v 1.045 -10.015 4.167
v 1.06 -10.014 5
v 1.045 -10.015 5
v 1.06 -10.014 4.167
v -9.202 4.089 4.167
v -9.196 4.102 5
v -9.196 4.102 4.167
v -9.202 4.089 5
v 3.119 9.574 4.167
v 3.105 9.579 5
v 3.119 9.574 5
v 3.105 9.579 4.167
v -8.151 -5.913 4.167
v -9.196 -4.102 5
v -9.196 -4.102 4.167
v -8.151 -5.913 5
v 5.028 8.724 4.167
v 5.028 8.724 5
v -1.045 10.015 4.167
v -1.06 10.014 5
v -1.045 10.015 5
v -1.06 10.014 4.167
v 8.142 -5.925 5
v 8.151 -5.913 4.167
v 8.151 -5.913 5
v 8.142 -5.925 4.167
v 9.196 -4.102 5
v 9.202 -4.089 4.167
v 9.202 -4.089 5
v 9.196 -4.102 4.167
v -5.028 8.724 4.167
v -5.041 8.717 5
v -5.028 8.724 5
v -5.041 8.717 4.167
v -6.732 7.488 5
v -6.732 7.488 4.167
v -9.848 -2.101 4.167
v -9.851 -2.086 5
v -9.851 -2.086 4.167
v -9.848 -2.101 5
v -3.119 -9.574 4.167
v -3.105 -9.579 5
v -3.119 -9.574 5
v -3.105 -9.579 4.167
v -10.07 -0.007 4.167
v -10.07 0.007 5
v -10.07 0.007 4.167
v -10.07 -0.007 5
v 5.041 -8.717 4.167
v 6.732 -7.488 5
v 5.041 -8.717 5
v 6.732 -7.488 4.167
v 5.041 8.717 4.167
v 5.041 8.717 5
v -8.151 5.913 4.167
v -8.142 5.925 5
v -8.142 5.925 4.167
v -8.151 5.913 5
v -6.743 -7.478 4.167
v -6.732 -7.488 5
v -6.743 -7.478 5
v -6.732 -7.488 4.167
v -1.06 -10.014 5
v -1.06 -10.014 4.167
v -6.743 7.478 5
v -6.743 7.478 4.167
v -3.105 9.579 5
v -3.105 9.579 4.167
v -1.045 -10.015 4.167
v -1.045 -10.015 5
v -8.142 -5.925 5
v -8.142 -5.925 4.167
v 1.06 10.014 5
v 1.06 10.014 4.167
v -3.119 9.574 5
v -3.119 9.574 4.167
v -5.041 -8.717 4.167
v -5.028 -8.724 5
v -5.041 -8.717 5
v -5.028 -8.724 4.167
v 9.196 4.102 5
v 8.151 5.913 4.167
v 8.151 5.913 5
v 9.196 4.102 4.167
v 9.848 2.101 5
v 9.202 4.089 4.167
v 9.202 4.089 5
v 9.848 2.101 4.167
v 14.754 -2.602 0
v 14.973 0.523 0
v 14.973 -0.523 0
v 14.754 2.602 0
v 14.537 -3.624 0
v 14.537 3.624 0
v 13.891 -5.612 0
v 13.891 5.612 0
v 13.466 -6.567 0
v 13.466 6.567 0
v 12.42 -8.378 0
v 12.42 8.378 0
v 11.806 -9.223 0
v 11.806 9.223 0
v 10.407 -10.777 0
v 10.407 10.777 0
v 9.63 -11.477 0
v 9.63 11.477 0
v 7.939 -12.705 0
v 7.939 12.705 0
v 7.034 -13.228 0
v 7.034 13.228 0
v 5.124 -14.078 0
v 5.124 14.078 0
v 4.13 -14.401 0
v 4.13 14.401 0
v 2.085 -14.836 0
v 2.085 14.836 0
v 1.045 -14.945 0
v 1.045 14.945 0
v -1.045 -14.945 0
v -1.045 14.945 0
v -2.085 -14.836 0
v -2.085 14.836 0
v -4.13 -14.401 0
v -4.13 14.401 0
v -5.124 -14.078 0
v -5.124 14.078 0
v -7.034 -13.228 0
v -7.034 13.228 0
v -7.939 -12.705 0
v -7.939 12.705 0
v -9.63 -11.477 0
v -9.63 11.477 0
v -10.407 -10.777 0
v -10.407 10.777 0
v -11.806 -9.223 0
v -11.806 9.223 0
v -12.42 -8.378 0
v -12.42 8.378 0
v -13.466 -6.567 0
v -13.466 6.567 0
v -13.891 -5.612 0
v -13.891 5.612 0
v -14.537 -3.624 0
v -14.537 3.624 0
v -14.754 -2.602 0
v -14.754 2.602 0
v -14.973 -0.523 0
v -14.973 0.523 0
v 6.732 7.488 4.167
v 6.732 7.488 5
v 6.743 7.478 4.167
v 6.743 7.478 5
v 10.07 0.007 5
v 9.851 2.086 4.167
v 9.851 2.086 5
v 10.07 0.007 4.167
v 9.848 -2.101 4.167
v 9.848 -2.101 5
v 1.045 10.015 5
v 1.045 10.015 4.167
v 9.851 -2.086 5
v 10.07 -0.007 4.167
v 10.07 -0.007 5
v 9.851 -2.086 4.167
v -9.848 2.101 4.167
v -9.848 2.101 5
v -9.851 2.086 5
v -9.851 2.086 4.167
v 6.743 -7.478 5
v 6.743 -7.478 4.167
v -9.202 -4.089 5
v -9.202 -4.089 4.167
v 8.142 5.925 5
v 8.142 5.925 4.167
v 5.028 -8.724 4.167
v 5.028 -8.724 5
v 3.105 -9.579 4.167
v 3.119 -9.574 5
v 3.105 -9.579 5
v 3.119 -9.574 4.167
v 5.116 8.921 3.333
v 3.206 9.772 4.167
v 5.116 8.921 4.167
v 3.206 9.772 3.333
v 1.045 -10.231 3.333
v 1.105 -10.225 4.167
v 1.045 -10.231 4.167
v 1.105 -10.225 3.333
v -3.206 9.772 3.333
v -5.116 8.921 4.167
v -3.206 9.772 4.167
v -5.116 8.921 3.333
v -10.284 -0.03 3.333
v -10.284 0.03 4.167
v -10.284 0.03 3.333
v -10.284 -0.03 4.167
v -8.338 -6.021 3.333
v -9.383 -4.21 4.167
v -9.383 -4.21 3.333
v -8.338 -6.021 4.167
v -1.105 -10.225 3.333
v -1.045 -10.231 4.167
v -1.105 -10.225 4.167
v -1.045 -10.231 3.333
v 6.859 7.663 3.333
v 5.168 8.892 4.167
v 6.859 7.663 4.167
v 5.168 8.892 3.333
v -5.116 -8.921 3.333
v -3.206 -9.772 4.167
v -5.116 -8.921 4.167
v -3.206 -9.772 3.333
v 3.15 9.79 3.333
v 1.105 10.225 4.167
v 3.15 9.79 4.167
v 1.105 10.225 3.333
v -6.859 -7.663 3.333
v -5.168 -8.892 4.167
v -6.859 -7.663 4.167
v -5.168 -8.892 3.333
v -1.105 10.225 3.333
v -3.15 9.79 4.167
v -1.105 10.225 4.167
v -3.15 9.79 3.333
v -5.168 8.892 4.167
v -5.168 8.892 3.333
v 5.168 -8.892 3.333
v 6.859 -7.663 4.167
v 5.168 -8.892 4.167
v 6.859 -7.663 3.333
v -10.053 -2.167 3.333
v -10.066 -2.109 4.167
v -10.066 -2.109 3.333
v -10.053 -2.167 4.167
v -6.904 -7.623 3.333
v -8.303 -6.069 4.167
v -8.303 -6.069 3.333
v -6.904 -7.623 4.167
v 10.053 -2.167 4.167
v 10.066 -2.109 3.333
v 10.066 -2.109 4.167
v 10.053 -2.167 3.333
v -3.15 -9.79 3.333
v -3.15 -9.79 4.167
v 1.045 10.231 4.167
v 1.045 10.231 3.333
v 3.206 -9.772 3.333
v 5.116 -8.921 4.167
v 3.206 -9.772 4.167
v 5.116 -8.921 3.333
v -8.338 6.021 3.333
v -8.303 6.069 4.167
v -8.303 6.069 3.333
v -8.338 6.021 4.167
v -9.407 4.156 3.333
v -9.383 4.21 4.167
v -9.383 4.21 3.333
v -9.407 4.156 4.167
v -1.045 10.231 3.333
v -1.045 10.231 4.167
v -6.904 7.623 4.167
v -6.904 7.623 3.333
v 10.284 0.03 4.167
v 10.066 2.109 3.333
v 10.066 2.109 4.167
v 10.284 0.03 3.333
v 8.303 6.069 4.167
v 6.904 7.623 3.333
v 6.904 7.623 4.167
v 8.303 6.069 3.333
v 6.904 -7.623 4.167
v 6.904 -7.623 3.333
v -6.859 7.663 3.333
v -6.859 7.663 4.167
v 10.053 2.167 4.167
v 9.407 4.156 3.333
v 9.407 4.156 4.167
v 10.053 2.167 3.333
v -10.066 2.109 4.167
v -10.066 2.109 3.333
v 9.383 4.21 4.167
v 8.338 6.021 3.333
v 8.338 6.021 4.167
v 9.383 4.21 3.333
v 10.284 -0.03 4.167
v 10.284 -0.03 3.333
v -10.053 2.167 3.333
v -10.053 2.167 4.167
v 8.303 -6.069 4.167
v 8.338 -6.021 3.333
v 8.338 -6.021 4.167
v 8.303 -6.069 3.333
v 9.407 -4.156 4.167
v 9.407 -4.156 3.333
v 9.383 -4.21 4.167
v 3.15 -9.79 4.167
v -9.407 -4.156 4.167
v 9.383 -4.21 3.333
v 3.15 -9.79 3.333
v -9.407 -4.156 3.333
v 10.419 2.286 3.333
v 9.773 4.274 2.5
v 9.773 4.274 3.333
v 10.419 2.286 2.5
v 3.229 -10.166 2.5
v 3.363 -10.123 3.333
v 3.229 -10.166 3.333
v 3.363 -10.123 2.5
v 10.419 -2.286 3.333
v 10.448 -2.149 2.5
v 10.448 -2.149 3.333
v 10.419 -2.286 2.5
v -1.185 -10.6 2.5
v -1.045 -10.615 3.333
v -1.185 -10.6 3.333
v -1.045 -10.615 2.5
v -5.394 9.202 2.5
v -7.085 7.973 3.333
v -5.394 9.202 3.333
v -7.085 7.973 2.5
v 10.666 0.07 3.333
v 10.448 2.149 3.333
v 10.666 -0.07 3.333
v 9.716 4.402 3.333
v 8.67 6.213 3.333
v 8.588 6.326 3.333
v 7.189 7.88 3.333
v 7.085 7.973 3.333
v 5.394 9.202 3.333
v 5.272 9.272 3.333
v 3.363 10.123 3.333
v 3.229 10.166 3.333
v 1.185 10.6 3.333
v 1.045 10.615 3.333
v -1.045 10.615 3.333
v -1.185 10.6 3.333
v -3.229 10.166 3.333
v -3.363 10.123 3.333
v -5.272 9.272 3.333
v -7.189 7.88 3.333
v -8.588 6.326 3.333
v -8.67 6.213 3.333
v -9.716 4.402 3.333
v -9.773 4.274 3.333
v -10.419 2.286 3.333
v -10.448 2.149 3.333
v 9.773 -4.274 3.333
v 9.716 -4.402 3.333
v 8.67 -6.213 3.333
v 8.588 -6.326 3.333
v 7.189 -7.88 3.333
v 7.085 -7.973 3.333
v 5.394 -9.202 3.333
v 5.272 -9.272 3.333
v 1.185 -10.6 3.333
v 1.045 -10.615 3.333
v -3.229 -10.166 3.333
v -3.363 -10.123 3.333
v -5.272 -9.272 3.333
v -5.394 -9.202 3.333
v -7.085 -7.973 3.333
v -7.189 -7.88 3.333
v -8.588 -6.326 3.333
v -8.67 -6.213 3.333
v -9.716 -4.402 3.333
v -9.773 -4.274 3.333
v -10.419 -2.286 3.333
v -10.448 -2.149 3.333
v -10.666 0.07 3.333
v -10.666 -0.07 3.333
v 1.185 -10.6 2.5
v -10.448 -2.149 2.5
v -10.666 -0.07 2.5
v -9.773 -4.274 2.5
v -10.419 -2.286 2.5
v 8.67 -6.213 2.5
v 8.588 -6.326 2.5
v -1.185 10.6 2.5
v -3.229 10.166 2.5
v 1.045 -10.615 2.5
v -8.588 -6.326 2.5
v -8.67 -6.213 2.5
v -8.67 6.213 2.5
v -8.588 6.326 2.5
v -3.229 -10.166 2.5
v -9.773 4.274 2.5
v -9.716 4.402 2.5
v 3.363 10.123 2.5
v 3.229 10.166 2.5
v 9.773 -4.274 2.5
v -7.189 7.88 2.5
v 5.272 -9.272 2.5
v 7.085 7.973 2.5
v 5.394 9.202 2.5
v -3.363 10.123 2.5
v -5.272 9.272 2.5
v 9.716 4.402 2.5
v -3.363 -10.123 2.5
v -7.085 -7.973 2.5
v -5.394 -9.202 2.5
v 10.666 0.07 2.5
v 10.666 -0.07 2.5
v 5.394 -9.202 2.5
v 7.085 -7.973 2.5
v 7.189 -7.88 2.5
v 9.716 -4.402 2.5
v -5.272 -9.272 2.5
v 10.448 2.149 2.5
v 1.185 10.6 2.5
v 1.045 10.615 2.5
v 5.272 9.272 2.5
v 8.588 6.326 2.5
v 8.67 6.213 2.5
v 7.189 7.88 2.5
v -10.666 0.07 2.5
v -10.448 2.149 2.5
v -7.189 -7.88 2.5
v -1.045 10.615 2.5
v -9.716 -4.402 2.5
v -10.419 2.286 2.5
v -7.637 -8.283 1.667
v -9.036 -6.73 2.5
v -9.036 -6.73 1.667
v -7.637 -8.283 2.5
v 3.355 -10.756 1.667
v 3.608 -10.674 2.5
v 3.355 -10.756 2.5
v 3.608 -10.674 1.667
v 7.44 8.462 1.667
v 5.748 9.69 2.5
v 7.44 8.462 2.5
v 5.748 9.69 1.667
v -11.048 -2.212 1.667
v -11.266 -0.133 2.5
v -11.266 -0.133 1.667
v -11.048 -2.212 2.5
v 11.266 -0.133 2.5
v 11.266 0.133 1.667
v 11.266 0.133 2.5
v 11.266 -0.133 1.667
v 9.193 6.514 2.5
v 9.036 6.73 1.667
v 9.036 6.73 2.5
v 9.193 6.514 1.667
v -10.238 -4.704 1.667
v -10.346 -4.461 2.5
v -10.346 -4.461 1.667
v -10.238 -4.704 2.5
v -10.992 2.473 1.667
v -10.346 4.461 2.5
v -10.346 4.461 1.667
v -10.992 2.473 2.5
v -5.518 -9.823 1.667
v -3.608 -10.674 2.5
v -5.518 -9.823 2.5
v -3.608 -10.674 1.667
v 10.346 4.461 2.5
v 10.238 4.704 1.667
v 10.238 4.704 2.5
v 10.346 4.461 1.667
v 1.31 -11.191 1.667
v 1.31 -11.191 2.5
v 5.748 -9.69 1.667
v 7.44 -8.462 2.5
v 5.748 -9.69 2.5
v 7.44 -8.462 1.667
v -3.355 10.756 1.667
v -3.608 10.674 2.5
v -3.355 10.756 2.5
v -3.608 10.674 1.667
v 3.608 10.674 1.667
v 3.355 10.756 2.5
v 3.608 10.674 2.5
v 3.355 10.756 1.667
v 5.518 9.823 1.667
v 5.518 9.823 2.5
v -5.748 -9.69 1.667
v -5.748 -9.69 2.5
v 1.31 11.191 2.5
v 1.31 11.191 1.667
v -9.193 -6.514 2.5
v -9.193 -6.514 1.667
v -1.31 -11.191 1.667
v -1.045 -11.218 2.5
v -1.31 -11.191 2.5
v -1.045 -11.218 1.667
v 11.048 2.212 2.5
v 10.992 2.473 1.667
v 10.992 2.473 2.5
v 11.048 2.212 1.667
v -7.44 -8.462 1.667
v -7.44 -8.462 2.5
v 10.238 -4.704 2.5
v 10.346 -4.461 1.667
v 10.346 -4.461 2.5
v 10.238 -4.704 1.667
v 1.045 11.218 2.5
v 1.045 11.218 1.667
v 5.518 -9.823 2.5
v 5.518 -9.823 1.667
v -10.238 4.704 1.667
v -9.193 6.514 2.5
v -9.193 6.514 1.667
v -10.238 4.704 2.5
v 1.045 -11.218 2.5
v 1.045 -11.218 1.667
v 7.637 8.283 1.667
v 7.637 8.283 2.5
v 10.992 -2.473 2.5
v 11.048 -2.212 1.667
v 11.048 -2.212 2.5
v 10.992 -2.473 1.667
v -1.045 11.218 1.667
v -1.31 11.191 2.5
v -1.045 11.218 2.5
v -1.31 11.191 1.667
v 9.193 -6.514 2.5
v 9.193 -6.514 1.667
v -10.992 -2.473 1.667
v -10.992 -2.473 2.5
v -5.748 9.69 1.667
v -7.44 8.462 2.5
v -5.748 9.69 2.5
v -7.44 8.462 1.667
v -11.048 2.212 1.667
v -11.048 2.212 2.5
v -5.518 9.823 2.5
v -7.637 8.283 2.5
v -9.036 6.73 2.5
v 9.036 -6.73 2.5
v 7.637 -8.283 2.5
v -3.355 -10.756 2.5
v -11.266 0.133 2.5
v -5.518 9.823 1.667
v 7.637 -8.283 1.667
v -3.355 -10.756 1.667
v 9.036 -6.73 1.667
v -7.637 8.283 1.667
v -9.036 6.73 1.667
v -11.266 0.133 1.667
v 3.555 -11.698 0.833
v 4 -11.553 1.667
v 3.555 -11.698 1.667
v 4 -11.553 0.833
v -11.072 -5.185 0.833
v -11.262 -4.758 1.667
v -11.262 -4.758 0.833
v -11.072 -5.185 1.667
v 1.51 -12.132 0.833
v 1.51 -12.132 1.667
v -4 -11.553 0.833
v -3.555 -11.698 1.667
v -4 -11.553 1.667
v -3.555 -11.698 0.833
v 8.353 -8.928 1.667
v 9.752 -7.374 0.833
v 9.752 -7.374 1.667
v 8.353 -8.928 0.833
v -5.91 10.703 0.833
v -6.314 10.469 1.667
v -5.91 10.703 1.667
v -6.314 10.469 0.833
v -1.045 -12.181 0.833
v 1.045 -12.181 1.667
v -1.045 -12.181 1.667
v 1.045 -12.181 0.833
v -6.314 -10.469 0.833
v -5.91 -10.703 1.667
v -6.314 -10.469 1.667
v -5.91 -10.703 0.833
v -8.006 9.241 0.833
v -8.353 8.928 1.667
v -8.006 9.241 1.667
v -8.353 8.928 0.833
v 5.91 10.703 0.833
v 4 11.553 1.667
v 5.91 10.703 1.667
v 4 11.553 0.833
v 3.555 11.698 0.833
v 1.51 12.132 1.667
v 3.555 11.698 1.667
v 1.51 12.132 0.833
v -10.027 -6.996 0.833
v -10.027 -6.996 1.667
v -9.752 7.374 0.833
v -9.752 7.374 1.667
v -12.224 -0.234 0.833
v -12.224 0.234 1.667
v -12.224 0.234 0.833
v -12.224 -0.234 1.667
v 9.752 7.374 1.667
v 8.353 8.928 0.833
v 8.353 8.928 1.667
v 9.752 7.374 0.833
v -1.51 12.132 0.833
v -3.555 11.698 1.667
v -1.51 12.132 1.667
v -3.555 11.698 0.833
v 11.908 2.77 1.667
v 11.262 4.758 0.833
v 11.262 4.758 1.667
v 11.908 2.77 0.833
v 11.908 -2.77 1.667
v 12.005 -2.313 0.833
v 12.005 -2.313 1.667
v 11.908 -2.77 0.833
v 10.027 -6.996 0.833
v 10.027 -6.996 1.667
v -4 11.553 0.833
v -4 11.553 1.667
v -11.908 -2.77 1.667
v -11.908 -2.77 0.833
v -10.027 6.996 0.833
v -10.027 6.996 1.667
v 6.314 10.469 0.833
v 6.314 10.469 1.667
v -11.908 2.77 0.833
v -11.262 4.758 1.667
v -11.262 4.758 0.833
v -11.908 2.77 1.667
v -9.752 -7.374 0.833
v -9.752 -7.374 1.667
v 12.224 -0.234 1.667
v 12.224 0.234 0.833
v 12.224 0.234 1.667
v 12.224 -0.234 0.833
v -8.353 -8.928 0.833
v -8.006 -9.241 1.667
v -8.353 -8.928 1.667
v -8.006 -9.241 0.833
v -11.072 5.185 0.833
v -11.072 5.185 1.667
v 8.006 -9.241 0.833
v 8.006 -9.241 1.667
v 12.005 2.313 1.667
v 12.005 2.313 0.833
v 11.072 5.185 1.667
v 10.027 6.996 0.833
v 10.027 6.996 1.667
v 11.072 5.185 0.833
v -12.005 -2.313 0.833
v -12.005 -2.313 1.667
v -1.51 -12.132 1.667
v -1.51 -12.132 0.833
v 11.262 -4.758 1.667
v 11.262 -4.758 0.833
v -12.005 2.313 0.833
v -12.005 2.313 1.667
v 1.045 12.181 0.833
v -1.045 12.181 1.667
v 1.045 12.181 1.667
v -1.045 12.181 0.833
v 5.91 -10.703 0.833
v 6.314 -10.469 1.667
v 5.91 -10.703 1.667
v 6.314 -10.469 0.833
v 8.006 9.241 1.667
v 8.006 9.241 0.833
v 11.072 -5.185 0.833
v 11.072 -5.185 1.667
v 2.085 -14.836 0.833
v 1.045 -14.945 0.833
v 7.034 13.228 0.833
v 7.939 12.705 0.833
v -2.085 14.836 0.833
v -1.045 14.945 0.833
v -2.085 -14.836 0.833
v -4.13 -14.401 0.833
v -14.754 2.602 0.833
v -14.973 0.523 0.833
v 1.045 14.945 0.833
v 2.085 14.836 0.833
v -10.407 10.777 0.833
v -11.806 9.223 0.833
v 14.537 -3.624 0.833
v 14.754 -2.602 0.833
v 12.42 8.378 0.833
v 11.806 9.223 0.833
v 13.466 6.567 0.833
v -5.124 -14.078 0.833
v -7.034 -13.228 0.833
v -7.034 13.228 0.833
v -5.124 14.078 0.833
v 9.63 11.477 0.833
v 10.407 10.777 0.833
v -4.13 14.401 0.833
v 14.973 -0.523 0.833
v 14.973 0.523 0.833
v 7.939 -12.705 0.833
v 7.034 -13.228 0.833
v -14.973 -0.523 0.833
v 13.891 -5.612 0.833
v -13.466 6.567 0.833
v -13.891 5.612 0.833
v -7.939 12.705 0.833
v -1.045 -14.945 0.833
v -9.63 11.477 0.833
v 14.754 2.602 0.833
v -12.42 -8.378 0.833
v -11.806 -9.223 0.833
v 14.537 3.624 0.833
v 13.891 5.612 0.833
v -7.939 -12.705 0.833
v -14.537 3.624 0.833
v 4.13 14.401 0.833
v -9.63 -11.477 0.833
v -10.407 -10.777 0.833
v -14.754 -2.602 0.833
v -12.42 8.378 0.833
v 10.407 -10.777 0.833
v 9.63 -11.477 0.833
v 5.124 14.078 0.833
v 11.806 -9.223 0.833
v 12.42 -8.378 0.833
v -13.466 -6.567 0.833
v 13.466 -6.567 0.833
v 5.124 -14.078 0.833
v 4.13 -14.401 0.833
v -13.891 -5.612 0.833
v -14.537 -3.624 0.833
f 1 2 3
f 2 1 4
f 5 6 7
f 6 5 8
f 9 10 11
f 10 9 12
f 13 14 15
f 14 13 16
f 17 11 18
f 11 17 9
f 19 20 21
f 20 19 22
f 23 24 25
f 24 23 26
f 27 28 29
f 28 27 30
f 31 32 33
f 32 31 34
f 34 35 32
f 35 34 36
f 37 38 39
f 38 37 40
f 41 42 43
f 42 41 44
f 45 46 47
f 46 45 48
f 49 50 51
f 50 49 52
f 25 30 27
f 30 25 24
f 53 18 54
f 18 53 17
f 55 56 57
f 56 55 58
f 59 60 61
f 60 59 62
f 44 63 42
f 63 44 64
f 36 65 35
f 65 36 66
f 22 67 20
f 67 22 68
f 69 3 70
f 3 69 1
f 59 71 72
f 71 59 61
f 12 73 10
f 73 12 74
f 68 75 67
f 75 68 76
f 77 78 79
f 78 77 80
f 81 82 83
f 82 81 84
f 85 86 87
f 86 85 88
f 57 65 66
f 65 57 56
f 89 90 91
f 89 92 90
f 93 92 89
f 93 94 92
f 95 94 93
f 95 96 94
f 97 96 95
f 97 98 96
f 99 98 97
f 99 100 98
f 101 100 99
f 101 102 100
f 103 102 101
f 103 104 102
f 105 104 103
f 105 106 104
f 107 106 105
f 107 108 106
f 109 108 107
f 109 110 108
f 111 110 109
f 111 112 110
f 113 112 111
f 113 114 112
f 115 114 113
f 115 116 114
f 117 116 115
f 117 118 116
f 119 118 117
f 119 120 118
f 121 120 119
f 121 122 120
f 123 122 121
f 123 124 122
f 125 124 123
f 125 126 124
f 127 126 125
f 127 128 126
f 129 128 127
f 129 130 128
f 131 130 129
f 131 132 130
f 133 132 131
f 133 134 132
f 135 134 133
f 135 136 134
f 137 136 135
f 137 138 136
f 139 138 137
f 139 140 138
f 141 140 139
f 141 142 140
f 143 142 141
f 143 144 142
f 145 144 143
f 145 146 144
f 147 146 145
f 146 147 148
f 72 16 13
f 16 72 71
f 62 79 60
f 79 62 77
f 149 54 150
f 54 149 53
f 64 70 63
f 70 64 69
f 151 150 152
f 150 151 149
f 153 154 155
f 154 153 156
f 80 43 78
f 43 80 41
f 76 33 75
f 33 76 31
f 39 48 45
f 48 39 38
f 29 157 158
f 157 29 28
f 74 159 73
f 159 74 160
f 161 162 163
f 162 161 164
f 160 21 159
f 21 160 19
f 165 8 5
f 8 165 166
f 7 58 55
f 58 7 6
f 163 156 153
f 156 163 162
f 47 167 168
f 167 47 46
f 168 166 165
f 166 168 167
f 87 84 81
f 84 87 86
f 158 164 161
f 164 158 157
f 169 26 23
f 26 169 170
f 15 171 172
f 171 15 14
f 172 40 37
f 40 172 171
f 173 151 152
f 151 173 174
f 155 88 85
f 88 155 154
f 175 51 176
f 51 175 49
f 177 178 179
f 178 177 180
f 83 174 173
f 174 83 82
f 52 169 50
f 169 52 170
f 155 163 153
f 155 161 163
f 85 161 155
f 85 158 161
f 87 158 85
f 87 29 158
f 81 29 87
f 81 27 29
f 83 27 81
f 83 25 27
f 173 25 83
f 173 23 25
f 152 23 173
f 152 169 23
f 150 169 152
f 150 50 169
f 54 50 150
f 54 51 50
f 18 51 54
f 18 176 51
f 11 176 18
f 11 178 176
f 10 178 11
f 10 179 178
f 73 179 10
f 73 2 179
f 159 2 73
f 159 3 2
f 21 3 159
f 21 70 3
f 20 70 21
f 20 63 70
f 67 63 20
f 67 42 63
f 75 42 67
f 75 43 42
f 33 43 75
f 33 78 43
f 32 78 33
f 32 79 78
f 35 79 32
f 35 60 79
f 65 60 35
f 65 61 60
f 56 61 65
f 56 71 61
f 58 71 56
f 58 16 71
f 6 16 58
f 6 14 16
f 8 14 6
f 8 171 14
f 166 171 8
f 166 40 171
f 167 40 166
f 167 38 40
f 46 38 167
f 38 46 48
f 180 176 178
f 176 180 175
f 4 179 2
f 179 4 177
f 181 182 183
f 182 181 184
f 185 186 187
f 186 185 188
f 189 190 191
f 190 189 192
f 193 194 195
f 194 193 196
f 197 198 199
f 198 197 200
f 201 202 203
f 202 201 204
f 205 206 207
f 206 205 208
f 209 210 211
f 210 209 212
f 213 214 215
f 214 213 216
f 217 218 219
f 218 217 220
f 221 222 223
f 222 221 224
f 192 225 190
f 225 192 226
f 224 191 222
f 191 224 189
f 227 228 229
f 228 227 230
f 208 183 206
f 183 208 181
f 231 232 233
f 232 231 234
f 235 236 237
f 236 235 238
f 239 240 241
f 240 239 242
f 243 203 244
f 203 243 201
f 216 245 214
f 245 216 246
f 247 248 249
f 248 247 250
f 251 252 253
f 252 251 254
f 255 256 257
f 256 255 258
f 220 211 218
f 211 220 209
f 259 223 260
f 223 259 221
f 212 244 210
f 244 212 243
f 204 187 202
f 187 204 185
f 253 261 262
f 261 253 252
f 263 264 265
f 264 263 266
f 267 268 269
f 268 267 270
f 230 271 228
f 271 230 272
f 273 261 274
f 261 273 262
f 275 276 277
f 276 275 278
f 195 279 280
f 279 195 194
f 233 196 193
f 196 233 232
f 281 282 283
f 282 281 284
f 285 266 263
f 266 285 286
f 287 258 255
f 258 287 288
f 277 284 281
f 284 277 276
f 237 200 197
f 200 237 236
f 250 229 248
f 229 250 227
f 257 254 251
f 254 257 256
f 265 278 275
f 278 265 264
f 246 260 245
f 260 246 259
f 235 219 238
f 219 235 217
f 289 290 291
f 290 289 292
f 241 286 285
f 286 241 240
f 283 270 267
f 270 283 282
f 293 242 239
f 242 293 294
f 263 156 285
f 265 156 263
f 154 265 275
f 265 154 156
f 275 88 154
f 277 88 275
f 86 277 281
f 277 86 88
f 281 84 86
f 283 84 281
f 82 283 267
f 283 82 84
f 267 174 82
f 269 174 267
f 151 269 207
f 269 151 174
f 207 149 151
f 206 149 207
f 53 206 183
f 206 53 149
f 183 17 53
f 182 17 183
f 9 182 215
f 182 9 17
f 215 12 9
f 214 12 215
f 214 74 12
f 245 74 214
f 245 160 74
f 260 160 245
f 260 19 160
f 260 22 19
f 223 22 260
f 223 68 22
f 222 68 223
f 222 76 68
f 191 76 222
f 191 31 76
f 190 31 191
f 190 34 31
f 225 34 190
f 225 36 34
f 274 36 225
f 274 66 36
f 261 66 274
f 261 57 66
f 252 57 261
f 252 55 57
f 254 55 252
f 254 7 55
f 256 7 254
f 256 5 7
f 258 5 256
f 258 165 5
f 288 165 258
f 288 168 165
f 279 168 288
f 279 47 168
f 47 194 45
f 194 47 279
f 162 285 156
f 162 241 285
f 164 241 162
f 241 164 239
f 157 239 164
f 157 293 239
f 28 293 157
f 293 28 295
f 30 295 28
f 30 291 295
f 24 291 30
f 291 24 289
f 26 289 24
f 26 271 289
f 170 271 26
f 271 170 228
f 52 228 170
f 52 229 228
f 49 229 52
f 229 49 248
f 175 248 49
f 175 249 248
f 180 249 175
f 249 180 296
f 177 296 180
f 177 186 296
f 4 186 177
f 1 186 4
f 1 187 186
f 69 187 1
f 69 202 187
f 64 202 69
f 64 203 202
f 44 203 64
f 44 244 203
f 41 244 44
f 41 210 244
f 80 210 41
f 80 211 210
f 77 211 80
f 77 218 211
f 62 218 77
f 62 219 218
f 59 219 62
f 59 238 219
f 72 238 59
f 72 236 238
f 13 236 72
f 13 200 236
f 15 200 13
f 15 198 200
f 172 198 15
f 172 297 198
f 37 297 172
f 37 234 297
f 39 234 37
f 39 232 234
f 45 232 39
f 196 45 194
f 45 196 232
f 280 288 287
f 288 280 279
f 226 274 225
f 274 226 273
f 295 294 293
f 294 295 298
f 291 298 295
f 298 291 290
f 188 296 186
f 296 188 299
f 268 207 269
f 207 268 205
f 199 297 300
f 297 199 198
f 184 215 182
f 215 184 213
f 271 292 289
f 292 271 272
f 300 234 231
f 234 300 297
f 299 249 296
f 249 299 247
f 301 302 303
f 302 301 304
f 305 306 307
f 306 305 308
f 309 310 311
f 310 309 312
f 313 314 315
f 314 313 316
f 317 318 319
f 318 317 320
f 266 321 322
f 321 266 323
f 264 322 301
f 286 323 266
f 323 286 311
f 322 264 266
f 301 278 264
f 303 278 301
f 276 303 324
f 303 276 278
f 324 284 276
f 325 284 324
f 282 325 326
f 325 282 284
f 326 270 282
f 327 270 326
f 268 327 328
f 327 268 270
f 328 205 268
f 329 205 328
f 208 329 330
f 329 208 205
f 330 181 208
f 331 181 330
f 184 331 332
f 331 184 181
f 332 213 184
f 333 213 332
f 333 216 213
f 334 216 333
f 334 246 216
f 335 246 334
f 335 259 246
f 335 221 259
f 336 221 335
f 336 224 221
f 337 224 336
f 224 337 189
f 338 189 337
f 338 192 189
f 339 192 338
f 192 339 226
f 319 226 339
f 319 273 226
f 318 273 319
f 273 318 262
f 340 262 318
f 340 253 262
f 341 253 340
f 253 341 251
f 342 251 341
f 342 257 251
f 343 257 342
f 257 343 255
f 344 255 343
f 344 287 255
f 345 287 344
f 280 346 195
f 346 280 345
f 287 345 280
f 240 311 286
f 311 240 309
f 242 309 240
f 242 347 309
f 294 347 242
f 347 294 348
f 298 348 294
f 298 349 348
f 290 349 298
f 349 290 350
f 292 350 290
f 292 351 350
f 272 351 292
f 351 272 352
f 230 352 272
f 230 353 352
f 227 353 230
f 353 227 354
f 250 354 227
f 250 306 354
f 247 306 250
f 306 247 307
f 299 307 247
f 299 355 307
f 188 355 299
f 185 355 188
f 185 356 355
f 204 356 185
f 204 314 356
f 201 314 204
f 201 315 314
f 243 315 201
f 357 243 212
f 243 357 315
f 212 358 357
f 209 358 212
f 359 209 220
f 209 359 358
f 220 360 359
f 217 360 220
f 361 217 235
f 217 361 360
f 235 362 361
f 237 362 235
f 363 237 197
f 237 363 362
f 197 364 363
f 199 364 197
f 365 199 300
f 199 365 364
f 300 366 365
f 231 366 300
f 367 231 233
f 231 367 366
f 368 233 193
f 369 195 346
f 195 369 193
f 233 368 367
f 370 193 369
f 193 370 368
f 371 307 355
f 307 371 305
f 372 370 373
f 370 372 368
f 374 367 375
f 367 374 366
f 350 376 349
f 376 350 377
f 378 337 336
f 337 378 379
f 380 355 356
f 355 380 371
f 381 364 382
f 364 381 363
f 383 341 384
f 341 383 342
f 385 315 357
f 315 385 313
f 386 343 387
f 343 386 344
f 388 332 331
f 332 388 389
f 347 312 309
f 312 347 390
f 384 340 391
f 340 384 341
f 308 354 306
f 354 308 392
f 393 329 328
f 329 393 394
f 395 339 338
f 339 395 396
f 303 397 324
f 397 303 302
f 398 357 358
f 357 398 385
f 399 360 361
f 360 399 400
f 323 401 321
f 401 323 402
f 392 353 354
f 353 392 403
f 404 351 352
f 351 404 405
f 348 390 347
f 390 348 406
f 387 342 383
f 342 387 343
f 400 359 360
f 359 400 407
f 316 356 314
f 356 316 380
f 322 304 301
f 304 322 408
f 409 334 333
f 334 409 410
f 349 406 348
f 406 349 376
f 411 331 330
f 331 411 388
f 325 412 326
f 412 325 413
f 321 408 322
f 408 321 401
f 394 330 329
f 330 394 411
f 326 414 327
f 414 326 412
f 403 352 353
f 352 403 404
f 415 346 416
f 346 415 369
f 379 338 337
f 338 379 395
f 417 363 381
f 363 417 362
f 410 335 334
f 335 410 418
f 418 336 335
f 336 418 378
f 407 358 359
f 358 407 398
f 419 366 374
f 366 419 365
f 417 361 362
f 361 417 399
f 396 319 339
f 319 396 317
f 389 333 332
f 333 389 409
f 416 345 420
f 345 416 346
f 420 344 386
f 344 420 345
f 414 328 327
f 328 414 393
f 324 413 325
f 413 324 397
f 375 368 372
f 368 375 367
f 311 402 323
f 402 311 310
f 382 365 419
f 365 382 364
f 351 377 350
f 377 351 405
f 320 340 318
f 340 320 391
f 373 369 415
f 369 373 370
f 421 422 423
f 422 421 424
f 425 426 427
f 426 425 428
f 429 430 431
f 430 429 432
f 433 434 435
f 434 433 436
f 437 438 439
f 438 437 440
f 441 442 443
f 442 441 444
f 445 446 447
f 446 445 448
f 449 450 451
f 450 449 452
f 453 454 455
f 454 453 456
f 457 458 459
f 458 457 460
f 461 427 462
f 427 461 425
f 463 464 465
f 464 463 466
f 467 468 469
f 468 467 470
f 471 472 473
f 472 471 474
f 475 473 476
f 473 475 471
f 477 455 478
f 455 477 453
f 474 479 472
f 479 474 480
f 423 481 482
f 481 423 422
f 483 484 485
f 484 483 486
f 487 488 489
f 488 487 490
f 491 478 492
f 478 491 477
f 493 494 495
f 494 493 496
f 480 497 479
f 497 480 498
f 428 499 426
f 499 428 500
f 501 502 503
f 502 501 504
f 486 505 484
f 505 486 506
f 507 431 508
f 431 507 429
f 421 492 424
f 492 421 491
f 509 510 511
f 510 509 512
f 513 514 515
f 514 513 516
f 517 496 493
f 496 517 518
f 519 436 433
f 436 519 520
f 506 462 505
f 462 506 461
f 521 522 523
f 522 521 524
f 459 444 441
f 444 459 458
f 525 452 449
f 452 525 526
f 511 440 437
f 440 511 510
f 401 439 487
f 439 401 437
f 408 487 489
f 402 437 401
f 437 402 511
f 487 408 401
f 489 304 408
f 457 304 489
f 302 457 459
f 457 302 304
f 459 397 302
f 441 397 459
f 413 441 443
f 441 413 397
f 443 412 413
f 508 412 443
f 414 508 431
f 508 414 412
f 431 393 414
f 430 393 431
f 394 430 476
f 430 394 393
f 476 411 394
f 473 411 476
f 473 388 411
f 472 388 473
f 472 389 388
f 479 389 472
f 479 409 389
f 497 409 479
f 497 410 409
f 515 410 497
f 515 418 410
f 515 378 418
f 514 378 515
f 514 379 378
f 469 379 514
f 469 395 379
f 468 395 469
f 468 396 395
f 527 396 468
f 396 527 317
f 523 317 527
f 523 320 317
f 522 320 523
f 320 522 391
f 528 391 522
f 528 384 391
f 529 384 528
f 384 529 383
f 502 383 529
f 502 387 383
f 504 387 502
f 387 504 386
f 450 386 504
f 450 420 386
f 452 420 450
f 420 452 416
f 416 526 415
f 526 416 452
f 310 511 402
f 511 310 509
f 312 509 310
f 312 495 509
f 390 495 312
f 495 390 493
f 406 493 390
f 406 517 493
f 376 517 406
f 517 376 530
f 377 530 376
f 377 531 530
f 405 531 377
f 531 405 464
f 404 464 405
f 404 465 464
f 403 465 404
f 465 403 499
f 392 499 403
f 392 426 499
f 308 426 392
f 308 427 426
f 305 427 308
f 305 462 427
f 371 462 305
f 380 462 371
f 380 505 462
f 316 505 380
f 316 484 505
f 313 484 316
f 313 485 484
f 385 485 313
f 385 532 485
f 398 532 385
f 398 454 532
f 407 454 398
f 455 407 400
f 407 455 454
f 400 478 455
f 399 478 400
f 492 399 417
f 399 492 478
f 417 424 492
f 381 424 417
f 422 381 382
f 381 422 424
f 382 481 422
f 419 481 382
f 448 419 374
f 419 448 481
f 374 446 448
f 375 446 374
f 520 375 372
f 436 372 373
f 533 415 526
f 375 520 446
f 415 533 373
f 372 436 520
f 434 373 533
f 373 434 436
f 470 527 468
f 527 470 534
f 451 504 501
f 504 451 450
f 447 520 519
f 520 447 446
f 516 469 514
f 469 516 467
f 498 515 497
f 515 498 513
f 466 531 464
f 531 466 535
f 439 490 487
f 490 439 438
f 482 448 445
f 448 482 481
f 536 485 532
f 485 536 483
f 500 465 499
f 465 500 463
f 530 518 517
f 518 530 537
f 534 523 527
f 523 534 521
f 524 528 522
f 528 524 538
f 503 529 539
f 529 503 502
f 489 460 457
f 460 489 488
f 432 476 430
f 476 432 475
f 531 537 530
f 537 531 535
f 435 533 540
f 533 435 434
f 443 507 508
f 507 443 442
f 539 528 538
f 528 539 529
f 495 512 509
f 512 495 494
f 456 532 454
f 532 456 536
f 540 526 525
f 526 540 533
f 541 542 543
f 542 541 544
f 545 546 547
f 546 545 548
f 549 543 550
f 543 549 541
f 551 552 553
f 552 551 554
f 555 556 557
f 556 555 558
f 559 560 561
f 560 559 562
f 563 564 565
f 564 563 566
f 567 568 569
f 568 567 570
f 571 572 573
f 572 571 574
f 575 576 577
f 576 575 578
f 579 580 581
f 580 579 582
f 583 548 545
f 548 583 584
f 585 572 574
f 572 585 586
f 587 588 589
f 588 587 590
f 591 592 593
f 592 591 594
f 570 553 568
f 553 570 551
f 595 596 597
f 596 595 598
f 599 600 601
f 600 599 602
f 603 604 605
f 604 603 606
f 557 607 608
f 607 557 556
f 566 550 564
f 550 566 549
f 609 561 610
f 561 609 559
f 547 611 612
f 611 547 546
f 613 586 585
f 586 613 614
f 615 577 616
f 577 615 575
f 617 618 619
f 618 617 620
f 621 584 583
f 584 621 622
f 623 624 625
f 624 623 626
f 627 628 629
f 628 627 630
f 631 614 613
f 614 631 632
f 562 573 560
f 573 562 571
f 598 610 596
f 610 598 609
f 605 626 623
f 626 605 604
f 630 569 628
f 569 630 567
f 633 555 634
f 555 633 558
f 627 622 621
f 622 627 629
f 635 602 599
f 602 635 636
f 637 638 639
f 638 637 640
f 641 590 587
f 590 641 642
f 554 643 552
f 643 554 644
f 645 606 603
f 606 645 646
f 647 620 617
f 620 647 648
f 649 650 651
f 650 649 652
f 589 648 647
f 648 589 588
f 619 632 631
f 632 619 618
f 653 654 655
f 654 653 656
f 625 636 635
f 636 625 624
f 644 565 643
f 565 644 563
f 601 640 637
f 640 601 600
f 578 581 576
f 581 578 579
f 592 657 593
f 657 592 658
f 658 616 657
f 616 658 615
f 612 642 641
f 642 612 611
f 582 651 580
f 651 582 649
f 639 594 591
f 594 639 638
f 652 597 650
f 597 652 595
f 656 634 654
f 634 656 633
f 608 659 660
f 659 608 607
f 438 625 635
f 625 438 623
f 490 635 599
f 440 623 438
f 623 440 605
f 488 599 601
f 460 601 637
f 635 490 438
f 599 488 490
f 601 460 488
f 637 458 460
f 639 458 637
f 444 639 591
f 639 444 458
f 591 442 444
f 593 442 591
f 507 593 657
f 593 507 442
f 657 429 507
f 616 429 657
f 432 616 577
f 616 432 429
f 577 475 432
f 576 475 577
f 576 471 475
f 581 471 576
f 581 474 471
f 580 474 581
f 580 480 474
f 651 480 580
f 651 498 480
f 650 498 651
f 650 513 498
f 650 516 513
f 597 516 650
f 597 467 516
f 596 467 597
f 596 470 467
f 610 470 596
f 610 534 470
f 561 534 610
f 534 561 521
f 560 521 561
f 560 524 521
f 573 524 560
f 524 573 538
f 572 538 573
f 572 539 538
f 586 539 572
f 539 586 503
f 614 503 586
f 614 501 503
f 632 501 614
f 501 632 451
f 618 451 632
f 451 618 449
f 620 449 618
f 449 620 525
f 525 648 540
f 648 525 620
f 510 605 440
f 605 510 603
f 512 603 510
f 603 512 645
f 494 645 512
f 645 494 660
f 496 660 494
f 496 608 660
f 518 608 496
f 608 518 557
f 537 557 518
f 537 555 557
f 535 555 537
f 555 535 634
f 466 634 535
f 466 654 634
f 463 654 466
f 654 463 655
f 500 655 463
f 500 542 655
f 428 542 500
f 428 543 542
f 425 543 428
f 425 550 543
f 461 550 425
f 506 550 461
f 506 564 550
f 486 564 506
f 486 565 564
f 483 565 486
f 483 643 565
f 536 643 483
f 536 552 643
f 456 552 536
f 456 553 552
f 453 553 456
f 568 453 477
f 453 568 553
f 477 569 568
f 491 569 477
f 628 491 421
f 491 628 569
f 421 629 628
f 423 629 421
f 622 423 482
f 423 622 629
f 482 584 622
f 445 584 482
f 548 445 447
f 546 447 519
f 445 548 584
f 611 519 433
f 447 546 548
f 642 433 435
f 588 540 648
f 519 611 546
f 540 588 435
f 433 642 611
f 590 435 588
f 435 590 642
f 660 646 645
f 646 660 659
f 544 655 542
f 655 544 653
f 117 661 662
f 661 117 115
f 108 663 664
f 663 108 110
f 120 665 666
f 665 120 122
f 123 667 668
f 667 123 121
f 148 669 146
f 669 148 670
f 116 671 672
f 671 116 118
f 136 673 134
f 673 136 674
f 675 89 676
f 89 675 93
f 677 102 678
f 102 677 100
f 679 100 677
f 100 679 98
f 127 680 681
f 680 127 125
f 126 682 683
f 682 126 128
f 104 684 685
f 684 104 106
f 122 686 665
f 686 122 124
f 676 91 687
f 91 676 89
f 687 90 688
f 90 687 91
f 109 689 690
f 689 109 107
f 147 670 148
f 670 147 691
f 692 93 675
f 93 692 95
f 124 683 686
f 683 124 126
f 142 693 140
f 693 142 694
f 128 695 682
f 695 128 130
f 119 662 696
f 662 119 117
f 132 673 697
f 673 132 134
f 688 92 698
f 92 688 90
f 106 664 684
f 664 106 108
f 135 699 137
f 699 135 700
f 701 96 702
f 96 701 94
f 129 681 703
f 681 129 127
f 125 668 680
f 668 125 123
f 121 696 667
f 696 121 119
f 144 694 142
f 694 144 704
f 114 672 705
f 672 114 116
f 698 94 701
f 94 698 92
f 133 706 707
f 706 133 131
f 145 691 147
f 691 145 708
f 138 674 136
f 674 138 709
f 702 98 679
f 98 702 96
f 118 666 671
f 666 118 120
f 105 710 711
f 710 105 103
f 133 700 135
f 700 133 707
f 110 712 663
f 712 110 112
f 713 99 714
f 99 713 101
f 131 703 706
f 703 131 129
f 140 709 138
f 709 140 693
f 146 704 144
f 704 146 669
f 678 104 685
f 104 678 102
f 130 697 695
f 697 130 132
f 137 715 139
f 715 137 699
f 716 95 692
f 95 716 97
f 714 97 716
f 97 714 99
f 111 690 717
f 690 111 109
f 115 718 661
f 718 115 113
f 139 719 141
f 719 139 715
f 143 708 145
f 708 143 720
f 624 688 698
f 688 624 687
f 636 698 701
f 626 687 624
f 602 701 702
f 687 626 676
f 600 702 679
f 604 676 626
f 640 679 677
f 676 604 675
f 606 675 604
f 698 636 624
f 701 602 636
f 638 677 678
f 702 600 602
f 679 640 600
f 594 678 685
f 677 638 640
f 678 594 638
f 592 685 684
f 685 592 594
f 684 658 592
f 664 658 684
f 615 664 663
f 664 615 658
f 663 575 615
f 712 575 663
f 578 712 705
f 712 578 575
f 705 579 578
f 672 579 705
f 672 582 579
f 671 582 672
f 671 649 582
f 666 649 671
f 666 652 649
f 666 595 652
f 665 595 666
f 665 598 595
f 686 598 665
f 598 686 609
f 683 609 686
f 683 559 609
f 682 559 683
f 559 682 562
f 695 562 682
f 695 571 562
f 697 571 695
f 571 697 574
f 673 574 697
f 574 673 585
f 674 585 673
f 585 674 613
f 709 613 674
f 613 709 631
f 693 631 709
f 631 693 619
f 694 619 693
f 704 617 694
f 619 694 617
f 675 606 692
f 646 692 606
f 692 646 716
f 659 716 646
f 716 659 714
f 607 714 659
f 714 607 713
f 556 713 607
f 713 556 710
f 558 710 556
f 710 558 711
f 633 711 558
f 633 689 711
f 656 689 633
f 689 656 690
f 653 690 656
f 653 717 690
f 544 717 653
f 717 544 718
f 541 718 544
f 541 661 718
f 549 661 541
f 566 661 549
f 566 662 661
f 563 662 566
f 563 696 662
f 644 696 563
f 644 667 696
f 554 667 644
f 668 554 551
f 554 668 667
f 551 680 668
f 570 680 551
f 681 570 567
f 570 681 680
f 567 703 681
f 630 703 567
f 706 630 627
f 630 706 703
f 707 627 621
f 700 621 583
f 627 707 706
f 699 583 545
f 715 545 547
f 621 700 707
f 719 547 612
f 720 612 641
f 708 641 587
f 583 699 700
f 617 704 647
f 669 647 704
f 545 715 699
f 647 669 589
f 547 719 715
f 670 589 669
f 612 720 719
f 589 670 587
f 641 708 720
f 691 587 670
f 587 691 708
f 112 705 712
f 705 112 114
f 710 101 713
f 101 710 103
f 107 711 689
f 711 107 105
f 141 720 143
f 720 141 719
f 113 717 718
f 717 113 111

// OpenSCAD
union() {
    union() {
        linear_extrude(height=5) {
            offset(r=0.06993351408365323) {
                circle(r=10);
            };
        };
        linear_extrude(height=4.166666666666667) {
            offset(r=0.2859547920896832) {
                circle(r=10);
            };
        };
        linear_extrude(height=3.333333333333333) {
            offset(r=0.669872981077807) {
                circle(r=10);
            };
        };
        linear_extrude(height=2.5) {
            offset(r=1.2732200375003506) {
                circle(r=10);
            };
        };
        linear_extrude(height=1.6666666666666665) {
            offset(r=2.236146008037167) {
                circle(r=10);
            };
        };
        linear_extrude(height=0.833333333333333) {
            offset(r=5) {
                circle(r=10);
            };
        };
    };
    %translate(v=[0, 0, 5]) {
        cylinder(r=10, h=10, center=true);
    };
};
